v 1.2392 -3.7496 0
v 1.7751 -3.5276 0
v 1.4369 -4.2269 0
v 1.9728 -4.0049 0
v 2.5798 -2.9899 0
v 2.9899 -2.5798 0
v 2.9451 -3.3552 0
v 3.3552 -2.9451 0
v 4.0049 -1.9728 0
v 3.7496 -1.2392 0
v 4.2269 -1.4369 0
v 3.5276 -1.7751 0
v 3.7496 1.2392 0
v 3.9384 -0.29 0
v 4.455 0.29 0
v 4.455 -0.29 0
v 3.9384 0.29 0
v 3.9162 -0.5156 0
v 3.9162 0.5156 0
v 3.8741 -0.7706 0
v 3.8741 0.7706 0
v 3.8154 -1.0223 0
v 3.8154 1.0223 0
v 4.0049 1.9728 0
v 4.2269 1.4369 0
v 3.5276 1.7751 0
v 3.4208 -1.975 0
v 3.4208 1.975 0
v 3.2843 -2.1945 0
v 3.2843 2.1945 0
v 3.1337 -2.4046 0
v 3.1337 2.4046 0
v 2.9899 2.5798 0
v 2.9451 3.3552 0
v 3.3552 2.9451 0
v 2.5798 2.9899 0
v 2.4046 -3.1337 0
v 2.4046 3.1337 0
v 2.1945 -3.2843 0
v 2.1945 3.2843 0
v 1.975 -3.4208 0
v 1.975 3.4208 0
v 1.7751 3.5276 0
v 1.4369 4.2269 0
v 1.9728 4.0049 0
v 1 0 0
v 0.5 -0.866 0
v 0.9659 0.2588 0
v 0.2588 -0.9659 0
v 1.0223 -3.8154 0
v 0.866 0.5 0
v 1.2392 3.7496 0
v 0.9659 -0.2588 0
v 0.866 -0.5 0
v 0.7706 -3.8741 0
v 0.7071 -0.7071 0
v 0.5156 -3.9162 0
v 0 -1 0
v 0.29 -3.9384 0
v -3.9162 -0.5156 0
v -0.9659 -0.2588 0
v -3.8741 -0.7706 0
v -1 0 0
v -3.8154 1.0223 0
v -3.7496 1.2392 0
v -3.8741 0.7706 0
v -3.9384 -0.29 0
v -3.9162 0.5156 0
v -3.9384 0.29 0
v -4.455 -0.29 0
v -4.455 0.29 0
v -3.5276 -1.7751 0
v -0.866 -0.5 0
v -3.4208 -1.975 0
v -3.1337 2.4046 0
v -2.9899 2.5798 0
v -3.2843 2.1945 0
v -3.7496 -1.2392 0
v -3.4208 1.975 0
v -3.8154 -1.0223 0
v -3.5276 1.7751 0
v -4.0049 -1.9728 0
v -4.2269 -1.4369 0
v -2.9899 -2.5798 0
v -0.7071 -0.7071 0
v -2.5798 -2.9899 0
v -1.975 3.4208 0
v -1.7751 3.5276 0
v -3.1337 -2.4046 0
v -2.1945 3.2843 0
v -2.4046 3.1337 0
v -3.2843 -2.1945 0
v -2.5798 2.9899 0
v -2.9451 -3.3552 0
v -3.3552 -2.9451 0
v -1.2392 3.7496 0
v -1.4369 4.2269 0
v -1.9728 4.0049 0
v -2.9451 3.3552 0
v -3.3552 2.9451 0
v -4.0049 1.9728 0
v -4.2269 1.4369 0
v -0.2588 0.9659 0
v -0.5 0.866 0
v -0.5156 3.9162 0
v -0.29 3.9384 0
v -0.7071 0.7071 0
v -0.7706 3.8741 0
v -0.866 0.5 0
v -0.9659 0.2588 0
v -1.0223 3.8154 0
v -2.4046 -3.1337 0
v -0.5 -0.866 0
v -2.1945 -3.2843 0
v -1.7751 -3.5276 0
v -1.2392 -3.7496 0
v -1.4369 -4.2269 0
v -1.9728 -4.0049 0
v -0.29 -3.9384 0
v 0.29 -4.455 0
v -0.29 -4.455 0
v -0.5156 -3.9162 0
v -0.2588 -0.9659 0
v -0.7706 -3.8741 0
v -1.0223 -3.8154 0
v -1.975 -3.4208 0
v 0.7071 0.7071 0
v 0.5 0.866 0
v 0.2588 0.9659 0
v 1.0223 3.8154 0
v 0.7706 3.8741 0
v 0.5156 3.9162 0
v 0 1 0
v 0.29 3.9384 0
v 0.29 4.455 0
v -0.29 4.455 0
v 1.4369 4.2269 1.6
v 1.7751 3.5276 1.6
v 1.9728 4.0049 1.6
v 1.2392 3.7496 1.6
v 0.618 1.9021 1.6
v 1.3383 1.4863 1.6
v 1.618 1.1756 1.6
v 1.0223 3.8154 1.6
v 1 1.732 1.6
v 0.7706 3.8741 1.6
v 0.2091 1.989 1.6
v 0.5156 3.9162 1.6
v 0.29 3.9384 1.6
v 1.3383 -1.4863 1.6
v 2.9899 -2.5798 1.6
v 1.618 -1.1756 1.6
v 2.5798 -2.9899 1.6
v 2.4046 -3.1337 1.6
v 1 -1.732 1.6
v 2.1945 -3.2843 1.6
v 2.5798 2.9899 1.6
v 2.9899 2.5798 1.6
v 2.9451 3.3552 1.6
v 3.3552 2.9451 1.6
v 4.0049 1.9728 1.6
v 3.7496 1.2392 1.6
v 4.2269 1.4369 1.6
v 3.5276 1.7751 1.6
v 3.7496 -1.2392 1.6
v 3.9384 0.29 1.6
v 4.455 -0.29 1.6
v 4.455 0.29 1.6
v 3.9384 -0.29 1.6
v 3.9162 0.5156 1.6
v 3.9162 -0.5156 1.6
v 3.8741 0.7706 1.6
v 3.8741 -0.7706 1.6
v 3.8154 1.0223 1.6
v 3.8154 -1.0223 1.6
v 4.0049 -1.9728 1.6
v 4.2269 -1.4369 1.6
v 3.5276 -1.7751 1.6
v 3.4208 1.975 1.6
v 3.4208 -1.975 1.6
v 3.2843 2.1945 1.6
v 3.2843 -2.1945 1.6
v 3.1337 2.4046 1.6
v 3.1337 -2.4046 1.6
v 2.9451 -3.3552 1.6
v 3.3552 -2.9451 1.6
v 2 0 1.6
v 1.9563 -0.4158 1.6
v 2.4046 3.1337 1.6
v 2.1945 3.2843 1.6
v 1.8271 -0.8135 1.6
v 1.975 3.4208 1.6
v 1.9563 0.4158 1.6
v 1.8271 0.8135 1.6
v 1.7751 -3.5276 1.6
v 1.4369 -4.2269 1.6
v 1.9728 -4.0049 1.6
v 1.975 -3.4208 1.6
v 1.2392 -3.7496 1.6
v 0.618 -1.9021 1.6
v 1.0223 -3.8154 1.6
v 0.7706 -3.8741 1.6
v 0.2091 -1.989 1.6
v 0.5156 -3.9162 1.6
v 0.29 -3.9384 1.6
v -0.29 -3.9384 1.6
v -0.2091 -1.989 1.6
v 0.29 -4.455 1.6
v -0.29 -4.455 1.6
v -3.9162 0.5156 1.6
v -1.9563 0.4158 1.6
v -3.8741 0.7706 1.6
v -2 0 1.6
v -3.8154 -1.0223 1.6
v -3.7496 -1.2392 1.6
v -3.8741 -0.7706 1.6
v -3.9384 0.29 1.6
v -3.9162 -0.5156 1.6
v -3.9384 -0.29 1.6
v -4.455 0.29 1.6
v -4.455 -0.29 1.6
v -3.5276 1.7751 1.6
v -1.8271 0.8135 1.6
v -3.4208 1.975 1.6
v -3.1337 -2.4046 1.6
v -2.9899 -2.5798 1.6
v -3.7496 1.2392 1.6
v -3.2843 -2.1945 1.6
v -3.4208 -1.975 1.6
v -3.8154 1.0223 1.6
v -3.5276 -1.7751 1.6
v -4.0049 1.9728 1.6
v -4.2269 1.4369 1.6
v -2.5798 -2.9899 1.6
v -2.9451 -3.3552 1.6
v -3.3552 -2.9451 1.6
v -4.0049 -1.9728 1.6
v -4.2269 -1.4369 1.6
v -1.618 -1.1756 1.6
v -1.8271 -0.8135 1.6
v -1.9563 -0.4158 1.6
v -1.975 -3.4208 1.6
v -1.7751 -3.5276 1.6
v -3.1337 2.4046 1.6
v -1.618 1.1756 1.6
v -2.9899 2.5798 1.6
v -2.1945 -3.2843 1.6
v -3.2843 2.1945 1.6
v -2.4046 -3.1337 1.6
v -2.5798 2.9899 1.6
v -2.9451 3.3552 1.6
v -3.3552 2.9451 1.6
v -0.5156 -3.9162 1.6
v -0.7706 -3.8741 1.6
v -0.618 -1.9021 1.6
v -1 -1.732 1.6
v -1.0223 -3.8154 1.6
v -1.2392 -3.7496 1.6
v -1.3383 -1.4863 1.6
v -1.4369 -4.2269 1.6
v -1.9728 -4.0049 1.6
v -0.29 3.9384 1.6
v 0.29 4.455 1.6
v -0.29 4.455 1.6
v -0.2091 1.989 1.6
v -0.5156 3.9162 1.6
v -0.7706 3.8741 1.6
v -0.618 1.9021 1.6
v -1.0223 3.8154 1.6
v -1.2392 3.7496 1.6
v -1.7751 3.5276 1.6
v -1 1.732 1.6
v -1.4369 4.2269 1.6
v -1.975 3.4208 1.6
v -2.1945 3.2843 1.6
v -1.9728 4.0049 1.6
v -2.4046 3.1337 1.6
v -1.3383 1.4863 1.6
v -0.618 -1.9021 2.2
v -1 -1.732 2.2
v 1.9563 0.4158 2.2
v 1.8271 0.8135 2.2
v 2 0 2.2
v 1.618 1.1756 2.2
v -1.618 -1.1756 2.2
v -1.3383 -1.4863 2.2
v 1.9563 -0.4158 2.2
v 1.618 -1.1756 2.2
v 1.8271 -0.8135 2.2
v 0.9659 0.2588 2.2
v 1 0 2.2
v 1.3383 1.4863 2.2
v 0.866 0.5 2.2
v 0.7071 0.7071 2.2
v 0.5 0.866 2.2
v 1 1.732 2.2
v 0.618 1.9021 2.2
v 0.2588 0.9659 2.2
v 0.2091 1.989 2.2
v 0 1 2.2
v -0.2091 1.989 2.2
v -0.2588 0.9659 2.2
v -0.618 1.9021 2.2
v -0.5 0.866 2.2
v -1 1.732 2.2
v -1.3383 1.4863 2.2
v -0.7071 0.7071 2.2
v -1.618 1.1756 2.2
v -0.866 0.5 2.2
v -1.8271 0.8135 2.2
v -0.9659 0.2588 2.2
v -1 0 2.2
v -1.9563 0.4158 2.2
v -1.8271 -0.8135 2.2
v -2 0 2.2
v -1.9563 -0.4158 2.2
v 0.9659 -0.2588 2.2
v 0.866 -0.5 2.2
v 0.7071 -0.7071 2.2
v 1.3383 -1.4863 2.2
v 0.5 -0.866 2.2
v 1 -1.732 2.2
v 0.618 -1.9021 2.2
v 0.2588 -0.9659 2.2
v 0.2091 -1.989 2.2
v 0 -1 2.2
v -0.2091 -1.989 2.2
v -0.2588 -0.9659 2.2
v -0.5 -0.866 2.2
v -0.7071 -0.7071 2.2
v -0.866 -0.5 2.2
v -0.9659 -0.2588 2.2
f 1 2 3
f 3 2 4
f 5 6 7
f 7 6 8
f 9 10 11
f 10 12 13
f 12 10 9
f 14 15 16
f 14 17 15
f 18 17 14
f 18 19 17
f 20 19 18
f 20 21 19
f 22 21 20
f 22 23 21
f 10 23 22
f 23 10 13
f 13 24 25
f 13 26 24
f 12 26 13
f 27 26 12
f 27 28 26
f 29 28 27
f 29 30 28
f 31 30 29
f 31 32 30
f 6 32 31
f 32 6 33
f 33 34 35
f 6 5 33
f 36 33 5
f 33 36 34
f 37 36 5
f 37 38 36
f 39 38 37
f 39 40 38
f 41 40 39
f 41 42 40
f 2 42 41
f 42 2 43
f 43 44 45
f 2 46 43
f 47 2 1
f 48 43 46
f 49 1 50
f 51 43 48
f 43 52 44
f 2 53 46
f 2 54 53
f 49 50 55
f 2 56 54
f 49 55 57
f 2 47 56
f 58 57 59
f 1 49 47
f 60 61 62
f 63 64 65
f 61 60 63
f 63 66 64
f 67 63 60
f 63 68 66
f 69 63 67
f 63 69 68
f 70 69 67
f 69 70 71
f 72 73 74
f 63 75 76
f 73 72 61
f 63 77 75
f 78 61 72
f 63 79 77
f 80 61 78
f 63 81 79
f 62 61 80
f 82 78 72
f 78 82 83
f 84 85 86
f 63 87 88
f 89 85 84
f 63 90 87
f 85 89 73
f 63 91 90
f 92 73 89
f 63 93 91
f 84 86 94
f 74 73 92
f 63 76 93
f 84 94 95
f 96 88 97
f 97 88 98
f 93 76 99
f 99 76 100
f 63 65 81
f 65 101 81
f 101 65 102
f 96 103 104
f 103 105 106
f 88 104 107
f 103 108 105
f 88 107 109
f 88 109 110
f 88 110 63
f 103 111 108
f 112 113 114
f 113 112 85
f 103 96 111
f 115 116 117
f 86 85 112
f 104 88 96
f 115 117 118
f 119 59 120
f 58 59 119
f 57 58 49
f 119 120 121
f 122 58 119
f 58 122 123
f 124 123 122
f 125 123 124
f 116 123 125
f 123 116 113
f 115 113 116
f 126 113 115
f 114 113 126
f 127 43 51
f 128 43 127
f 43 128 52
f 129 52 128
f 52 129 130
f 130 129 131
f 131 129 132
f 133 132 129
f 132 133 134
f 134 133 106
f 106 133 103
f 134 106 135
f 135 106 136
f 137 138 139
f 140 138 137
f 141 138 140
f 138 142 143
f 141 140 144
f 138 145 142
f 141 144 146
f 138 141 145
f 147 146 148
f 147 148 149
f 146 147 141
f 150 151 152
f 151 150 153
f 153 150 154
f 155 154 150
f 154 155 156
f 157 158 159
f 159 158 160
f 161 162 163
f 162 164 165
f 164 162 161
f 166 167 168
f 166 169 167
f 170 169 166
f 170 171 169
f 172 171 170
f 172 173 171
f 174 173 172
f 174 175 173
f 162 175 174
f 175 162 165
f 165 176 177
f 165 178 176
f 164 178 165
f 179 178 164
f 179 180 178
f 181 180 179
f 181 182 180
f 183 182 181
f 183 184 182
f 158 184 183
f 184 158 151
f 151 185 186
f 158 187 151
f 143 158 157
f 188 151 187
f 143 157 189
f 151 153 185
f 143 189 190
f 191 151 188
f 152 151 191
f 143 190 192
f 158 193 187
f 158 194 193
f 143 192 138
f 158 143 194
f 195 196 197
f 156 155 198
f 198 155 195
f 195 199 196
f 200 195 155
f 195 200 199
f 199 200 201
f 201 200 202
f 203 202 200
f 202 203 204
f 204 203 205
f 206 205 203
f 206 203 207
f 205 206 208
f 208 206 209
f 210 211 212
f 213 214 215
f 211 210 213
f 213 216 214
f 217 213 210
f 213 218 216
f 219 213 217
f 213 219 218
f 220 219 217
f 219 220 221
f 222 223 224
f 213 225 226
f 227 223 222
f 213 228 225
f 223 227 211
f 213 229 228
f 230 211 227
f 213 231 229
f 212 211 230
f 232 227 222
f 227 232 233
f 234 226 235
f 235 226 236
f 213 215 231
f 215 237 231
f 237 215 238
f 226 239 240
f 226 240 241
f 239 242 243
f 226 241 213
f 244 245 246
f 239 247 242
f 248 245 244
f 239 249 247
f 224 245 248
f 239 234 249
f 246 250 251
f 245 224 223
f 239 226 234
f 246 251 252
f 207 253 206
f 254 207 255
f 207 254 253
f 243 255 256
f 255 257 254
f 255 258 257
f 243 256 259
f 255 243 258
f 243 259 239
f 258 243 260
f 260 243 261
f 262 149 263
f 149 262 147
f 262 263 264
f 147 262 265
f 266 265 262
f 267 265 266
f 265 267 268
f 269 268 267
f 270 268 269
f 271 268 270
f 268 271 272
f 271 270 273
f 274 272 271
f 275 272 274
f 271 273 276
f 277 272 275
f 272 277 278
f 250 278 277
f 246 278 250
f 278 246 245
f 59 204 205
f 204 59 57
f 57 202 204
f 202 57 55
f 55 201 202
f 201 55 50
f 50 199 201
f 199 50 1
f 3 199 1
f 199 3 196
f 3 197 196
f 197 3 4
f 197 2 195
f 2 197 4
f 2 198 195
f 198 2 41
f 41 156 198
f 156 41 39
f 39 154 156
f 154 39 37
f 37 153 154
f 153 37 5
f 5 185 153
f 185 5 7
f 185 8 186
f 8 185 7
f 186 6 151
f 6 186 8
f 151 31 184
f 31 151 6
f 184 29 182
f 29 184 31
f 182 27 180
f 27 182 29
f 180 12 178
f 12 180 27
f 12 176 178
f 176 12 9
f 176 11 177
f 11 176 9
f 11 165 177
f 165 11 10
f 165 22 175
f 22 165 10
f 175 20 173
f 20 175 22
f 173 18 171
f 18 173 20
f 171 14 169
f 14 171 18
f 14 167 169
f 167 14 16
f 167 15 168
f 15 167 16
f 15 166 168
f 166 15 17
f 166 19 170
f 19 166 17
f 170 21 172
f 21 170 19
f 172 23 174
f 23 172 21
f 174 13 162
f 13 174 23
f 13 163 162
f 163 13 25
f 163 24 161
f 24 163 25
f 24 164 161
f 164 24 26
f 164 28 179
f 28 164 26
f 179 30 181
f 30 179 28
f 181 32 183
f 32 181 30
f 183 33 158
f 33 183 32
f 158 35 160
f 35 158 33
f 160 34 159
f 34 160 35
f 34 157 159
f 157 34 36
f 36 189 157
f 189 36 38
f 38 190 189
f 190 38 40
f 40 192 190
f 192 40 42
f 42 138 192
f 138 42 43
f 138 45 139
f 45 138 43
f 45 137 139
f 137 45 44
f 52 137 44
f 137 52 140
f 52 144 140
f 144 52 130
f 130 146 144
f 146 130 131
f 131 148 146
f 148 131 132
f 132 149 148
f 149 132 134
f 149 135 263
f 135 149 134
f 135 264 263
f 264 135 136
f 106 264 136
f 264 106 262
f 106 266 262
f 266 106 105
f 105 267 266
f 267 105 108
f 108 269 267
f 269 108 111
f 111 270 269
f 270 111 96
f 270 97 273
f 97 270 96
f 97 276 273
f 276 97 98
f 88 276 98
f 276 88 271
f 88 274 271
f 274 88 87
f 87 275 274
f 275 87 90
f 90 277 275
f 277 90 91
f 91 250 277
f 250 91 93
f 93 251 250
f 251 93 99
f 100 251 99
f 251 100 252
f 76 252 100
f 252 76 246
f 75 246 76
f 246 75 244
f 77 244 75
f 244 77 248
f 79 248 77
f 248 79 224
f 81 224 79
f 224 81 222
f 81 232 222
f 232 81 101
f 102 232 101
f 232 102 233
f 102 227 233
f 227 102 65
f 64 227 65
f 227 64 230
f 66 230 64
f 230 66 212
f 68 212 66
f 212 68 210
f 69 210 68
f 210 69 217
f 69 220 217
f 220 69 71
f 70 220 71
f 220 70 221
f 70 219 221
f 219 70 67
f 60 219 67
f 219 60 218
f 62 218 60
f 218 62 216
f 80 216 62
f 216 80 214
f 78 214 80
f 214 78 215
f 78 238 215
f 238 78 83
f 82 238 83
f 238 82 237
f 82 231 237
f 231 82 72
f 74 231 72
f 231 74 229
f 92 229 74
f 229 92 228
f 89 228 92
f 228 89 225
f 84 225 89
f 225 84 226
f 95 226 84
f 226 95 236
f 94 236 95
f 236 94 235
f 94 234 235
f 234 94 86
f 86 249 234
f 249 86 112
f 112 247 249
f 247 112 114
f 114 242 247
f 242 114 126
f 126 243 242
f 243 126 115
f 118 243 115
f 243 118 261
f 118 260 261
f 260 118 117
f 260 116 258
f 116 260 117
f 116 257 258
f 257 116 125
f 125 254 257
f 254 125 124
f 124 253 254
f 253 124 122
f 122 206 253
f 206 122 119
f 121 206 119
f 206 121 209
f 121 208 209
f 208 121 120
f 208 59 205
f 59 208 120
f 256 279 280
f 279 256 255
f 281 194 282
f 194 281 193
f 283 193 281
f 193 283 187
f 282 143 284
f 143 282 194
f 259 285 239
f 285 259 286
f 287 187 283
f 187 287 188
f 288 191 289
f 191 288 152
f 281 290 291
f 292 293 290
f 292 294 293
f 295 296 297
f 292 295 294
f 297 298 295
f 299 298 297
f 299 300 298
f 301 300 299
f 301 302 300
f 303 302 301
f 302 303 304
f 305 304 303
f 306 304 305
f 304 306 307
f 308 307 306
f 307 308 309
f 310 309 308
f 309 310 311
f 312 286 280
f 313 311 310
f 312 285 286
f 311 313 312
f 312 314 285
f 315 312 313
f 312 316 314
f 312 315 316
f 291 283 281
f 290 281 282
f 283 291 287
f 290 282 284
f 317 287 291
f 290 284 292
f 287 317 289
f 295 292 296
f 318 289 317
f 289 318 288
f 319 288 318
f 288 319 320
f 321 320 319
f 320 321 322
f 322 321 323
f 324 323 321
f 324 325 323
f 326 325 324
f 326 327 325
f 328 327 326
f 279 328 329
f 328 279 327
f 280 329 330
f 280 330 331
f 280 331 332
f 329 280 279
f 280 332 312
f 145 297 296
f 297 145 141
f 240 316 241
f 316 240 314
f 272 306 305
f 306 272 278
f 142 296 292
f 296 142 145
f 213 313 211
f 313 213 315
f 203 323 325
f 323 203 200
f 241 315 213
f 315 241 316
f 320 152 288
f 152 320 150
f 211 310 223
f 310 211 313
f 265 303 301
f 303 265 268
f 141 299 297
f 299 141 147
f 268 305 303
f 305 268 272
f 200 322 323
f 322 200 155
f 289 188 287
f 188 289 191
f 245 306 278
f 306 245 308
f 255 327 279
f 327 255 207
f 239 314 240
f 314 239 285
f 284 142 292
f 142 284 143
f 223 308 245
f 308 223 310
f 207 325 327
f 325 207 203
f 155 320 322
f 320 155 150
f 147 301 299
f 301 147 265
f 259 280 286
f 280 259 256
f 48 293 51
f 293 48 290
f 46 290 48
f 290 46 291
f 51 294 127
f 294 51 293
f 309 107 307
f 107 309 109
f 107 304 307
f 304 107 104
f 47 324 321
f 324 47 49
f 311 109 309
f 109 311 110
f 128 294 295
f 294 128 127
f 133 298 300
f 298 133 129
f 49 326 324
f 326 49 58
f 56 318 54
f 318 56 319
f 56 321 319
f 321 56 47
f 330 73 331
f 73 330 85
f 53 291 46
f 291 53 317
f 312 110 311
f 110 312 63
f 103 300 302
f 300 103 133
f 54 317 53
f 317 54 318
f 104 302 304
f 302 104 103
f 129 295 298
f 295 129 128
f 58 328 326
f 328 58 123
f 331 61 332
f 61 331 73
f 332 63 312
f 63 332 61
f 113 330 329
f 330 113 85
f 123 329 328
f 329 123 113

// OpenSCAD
// part_id: g2
// name: Exeligmos pinion gear (g2)
// source_drawing_ids: DRW-009
// units: mm
// revision: 0.1
// SPDX-License-Identifier: MIT

module part_g2(
    outer_r = 4.96,
    root_r = 3.95,
    thickness = 1.6,
    bore_d = 2.0,
    teeth = 16,
    hub_d = 4.0,
    hub_h = 0.6
) {
    difference() {
        union() {
            linear_extrude(height = thickness)
            union() {
                circle(r = root_r, $fn = 96);
                for (i = [0 : teeth - 1]) {
                    a = i * 360 / teeth;
                    rotate([0, 0, a]) translate([root_r, 0, 0]) square([outer_r - root_r, 0.58], center = true);
                }
            }
            translate([0, 0, thickness]) cylinder(d = hub_d, h = hub_h, center = false, $fn = 30);
        }
        translate([0, 0, -0.05]) cylinder(d = bore_d, h = thickness + hub_h + 0.1, $fn = 24);
    }
}

// ---- "main guard" ----
// Default to previewing when opened directly:
if (is_undef(__LIB_MODE__)) {
    part_g2();
}
